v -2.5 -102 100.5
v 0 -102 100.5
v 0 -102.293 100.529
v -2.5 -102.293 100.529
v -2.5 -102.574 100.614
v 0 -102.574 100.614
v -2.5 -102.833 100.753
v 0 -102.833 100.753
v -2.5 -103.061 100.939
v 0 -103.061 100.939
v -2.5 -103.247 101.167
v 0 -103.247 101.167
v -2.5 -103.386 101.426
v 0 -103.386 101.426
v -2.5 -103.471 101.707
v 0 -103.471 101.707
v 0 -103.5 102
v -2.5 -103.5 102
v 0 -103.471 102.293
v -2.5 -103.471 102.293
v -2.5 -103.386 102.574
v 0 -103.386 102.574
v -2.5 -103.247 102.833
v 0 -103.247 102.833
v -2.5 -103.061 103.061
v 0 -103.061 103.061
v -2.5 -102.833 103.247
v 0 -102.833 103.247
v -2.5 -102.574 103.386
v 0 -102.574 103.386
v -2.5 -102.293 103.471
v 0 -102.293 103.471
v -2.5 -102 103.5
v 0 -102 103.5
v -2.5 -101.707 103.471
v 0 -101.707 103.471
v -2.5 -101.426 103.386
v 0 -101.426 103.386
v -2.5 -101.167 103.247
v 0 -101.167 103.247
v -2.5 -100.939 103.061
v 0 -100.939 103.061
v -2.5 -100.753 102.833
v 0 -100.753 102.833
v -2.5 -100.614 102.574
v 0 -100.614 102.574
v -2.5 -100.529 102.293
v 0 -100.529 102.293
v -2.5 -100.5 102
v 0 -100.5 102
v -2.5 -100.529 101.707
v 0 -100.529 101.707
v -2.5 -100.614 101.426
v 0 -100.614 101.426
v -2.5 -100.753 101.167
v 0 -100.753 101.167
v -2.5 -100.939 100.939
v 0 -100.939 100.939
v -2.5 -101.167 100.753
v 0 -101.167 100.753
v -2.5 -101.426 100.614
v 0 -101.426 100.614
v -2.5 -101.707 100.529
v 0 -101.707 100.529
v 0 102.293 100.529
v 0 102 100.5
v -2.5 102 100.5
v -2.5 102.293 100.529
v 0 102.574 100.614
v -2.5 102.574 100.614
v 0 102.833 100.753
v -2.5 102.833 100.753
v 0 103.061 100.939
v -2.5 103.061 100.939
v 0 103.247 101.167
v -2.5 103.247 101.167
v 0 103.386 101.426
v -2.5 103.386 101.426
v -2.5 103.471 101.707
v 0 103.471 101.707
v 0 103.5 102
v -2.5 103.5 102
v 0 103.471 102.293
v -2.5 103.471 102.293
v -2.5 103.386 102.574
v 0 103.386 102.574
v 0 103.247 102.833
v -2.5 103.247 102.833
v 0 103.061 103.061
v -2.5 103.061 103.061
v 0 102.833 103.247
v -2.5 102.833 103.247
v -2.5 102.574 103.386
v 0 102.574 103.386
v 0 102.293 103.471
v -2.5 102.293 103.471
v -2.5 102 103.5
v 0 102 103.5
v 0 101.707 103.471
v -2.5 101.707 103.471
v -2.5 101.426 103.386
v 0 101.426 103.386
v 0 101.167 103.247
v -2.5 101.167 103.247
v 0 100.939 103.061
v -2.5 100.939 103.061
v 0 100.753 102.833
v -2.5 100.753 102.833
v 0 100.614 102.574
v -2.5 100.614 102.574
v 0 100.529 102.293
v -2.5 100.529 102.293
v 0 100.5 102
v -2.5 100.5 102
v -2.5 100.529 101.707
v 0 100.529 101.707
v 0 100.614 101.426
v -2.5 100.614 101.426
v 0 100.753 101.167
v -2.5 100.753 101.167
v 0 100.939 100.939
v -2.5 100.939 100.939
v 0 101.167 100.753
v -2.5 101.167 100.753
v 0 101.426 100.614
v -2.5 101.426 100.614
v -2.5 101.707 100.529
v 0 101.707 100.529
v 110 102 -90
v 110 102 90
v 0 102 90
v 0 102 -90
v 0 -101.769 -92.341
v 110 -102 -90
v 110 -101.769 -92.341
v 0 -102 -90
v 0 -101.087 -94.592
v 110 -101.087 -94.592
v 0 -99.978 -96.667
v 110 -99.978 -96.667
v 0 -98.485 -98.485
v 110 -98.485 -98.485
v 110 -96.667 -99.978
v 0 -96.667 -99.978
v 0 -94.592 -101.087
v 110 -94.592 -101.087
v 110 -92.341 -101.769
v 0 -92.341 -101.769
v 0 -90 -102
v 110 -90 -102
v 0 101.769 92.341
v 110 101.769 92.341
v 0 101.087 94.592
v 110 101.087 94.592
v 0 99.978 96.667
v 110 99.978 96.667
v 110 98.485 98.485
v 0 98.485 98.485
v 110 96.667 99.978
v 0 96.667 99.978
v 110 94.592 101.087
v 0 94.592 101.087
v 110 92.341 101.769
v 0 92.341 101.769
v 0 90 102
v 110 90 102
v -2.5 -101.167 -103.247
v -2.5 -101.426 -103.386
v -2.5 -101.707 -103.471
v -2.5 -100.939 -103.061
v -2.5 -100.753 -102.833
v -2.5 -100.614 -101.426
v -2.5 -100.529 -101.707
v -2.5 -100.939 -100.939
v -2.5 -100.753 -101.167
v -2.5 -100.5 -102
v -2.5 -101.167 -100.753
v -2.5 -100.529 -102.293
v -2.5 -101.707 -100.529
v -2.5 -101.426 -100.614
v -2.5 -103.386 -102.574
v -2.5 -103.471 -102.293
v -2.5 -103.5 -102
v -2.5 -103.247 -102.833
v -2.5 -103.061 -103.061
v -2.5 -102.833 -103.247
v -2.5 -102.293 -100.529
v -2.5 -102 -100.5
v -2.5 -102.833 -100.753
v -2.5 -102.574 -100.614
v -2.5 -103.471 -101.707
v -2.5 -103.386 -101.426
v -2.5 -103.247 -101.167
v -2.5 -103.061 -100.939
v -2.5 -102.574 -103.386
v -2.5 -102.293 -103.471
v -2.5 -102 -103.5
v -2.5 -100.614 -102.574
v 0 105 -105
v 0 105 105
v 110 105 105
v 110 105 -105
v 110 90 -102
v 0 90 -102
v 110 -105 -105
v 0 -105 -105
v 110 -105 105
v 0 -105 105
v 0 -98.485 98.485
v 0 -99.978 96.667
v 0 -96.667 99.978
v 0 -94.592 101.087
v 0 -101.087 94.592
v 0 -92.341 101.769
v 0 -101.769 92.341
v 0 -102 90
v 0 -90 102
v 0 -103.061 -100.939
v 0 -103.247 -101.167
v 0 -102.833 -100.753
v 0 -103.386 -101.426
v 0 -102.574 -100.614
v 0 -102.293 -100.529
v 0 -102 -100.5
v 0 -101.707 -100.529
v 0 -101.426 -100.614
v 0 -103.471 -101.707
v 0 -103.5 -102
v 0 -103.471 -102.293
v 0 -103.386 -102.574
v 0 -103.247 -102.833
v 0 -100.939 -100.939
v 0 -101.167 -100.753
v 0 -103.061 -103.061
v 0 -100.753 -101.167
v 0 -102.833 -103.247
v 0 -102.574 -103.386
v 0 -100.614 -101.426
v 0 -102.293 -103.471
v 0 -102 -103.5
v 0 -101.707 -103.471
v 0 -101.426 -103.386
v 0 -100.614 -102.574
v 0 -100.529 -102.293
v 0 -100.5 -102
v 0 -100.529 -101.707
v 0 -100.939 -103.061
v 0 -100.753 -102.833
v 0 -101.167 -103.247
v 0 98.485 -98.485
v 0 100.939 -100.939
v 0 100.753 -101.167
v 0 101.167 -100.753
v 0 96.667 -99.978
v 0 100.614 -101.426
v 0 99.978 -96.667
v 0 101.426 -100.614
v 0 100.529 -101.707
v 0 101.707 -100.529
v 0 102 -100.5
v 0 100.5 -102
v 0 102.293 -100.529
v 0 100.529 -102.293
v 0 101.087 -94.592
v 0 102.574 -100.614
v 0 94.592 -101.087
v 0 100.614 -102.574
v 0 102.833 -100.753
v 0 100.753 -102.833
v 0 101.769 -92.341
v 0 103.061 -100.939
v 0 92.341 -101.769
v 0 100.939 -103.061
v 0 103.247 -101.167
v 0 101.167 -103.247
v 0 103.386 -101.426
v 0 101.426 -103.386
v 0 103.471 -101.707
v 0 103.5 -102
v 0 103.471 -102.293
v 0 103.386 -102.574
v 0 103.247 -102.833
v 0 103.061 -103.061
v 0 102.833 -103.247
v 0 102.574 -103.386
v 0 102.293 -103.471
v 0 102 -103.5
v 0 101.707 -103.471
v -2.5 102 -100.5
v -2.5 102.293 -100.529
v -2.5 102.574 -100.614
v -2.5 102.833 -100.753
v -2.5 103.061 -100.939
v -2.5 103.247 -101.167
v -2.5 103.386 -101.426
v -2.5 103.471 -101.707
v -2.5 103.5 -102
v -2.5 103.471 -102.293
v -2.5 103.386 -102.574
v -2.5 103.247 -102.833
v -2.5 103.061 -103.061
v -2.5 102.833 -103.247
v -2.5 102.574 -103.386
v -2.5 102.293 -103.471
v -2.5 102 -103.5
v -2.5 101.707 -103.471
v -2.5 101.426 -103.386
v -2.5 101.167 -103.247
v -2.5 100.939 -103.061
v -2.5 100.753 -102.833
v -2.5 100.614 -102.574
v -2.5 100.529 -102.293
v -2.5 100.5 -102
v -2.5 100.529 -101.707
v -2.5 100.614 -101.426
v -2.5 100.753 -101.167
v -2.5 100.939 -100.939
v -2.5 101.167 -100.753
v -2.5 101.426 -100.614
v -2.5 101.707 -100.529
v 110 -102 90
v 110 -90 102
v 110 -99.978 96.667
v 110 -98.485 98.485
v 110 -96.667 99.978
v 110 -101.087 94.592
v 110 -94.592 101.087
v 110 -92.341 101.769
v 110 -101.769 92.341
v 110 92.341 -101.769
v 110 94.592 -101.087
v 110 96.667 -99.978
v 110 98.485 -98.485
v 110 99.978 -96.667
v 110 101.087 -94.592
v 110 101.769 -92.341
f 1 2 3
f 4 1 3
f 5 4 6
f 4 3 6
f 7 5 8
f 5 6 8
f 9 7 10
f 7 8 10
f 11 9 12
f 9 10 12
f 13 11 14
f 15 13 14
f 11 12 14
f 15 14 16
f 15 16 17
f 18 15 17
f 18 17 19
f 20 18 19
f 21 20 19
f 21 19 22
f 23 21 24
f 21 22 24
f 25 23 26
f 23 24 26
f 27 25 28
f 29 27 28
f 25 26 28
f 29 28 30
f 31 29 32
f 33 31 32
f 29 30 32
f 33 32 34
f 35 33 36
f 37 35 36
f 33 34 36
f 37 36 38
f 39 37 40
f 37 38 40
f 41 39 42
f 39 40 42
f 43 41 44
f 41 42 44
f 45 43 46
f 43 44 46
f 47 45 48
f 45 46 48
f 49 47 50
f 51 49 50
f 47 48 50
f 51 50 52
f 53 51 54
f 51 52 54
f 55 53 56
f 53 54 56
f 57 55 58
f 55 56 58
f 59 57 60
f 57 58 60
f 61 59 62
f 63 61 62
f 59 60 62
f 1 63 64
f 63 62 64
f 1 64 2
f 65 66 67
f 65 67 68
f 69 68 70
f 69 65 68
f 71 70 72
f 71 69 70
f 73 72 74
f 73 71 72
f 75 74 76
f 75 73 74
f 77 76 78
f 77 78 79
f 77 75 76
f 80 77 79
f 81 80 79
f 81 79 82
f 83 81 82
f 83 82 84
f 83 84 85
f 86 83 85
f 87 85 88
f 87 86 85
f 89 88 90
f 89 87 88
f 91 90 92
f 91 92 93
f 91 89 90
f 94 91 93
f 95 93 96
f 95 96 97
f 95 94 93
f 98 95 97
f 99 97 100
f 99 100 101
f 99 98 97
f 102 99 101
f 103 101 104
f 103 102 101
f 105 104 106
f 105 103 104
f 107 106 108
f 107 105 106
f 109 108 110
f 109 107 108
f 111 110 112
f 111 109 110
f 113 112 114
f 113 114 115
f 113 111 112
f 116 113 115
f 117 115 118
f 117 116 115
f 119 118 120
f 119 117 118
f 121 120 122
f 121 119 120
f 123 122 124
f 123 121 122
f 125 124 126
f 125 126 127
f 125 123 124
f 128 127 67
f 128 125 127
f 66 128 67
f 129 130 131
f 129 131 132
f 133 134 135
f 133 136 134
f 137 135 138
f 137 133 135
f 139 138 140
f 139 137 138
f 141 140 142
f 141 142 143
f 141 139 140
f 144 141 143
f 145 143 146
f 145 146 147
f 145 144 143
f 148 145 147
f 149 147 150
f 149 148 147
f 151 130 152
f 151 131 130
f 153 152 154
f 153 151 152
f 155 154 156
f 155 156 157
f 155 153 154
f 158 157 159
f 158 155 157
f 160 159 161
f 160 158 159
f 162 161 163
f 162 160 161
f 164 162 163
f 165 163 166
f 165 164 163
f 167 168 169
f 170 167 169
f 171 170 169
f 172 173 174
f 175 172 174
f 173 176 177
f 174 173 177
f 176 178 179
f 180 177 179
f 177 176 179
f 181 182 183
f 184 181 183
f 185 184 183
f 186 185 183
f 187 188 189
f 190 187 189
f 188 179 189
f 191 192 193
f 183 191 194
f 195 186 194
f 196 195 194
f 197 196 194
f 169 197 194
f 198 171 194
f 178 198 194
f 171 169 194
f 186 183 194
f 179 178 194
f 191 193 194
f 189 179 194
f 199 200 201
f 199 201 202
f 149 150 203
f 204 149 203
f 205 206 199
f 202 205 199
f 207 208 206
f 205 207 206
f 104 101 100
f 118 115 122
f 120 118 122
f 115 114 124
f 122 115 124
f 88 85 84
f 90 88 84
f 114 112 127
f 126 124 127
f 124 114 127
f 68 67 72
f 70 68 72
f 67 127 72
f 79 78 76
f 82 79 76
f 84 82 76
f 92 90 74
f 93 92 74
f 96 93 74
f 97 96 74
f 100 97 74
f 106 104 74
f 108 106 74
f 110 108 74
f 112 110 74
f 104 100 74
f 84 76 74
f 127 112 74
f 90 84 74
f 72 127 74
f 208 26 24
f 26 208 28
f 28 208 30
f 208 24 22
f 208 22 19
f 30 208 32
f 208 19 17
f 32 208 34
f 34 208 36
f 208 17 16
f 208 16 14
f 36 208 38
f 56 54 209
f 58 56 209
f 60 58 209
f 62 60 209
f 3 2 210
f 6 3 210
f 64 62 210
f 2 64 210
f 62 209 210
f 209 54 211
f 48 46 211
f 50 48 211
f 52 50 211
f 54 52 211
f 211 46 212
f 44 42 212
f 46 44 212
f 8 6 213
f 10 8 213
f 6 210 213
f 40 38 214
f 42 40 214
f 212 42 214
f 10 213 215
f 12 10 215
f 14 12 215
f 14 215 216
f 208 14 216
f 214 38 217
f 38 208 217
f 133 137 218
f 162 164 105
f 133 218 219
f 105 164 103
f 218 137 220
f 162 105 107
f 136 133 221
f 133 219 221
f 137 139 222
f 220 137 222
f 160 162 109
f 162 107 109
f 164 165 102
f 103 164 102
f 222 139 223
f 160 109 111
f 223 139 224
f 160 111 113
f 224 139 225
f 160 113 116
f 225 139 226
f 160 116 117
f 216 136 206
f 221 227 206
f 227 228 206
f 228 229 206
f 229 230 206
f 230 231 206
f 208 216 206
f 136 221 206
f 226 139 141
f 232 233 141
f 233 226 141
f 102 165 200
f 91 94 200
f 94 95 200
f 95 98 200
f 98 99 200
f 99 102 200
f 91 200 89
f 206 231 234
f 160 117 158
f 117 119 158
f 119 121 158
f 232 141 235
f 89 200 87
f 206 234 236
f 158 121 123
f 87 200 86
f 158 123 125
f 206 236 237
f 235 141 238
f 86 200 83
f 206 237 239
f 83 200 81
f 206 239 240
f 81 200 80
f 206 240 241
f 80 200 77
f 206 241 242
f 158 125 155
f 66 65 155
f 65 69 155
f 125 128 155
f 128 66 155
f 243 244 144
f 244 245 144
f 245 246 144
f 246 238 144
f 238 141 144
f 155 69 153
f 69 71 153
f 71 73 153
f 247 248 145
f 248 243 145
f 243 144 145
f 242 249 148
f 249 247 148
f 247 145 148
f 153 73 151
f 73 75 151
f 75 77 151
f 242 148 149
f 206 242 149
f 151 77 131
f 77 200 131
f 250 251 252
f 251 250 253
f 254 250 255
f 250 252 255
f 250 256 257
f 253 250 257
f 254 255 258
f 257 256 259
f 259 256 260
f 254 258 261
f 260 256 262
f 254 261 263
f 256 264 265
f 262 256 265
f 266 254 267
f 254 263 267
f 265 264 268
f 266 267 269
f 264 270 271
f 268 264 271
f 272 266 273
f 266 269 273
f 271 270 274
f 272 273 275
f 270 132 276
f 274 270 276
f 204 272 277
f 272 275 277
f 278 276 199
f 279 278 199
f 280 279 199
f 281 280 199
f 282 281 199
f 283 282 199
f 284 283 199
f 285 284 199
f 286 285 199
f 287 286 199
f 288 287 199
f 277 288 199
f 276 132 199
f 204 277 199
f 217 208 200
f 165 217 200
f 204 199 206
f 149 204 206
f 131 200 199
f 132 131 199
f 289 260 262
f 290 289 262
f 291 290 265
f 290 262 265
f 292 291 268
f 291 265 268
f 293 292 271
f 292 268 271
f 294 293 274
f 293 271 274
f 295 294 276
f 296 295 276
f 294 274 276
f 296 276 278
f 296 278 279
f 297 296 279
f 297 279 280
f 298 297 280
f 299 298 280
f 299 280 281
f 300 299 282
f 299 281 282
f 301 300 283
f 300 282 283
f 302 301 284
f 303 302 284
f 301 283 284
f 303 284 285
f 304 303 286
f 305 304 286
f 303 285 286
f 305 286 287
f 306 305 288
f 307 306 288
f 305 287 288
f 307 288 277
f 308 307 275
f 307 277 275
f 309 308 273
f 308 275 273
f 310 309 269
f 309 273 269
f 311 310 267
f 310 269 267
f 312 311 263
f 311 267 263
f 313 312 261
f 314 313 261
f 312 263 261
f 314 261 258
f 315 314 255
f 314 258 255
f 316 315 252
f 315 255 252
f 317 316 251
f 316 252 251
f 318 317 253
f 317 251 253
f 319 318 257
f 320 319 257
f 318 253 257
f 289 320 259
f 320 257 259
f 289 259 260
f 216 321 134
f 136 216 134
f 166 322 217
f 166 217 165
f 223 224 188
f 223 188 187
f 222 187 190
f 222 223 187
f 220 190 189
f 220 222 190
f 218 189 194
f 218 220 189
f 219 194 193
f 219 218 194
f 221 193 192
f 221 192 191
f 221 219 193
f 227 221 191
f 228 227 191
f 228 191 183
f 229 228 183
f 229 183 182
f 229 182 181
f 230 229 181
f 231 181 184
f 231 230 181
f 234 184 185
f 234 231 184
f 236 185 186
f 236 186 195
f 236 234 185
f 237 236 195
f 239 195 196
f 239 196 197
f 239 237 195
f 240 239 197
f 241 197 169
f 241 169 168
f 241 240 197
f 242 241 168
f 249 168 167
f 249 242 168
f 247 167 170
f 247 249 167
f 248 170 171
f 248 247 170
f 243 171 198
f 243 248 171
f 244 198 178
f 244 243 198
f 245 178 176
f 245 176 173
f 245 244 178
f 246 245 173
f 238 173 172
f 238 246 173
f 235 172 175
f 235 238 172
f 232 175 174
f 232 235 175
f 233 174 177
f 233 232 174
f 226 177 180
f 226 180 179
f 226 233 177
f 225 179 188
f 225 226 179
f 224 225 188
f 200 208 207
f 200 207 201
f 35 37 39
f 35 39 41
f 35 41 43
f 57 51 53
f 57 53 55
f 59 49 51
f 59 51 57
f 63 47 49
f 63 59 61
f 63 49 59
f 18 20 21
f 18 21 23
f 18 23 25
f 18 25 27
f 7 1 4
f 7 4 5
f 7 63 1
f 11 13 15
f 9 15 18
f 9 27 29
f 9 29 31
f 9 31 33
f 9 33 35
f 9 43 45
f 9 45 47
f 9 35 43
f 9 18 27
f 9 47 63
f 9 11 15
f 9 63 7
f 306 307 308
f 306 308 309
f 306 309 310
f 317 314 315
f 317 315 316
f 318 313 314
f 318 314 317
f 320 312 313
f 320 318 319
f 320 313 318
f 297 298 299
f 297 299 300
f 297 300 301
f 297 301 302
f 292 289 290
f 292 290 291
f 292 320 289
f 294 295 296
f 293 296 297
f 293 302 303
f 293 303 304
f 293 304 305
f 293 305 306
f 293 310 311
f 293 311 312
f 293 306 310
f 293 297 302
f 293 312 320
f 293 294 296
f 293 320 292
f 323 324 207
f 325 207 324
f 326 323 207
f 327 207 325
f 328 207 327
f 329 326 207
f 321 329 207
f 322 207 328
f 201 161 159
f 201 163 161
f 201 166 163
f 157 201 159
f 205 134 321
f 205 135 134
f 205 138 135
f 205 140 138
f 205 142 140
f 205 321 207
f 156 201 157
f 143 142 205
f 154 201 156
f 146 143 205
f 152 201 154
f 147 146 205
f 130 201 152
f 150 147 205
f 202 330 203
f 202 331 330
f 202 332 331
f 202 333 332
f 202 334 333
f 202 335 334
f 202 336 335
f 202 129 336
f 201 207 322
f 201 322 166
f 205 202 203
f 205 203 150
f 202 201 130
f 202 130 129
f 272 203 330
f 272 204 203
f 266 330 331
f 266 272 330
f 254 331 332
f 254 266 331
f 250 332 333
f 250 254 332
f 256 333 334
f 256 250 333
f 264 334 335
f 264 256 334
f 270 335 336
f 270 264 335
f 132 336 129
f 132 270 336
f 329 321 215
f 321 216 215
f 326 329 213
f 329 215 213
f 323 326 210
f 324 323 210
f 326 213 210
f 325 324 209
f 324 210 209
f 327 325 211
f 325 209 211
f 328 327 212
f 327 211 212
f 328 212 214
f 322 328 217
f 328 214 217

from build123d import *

# Parameters (mm, degrees)
SKETCH1_W               = 210
SKETCH1_H               = 210
BOSS_EXTRUDE1_DEPTH     = 110
SKETCH2_W               = 204
SKETCH2_H               = 204
CUT_EXTRUDE1_DEPTH      = 110
FILLET1_R               = 12
SKETCH3_R               = 1.5
BOSS_EXTRUDE2_DEPTH     = 2.5
MIRROR2_COPY_1_SKETCH_R = 1.5
MIRROR2_COPY_1_DEPTH    = 2.5


with BuildPart() as part:
    # Sketch1 → Boss-Extrude1 (new body)
    with BuildSketch(Plane(origin=(0, 0, 0), x_dir=(0, 0, -1), z_dir=(1, 0, 0))):
        Rectangle(SKETCH1_W, SKETCH1_H)
    extrude(amount=BOSS_EXTRUDE1_DEPTH)

    # Sketch2 → Cut-Extrude1 (cut)
    with BuildSketch(Plane(origin=(110, 0, 0), x_dir=(0, 0, -1), z_dir=(1, 0, 0))):
        Rectangle(SKETCH2_W, SKETCH2_H)
    extrude(amount=-CUT_EXTRUDE1_DEPTH, mode=Mode.SUBTRACT)

    # Fillet1
    fillet1_edges = [part.edges().sort_by_distance(p)[0] for p in [
        (55, -102, -102),
        (55, -102, 102),
        (55, 102, 102),
        (55, 102, -102),
    ]]
    fillet(fillet1_edges, radius=FILLET1_R)

    # Sketch3 → Boss-Extrude2 (add)
    with BuildSketch(Plane.ZY):
        with Locations((-102, 102)):
            Circle(SKETCH3_R)
    boss_extrude2 = extrude(amount=BOSS_EXTRUDE2_DEPTH)

    # Mirror1: Boss-Extrude2 across plane
    add(boss_extrude2.mirror(Plane.XY))

    # Mirror2: Boss-Extrude2 across plane
    add(boss_extrude2.mirror(Plane.ZX))

    # Mirror2 copy 1 sketch → Mirror2 copy 1 (add)
    with BuildSketch(Plane(origin=(0, 0, 0), x_dir=(0, 0, -1), z_dir=(-1, 0, 0))):
        with Locations((-102, 102)):
            Circle(MIRROR2_COPY_1_SKETCH_R)
    extrude(amount=MIRROR2_COPY_1_DEPTH)


solid = part.part
